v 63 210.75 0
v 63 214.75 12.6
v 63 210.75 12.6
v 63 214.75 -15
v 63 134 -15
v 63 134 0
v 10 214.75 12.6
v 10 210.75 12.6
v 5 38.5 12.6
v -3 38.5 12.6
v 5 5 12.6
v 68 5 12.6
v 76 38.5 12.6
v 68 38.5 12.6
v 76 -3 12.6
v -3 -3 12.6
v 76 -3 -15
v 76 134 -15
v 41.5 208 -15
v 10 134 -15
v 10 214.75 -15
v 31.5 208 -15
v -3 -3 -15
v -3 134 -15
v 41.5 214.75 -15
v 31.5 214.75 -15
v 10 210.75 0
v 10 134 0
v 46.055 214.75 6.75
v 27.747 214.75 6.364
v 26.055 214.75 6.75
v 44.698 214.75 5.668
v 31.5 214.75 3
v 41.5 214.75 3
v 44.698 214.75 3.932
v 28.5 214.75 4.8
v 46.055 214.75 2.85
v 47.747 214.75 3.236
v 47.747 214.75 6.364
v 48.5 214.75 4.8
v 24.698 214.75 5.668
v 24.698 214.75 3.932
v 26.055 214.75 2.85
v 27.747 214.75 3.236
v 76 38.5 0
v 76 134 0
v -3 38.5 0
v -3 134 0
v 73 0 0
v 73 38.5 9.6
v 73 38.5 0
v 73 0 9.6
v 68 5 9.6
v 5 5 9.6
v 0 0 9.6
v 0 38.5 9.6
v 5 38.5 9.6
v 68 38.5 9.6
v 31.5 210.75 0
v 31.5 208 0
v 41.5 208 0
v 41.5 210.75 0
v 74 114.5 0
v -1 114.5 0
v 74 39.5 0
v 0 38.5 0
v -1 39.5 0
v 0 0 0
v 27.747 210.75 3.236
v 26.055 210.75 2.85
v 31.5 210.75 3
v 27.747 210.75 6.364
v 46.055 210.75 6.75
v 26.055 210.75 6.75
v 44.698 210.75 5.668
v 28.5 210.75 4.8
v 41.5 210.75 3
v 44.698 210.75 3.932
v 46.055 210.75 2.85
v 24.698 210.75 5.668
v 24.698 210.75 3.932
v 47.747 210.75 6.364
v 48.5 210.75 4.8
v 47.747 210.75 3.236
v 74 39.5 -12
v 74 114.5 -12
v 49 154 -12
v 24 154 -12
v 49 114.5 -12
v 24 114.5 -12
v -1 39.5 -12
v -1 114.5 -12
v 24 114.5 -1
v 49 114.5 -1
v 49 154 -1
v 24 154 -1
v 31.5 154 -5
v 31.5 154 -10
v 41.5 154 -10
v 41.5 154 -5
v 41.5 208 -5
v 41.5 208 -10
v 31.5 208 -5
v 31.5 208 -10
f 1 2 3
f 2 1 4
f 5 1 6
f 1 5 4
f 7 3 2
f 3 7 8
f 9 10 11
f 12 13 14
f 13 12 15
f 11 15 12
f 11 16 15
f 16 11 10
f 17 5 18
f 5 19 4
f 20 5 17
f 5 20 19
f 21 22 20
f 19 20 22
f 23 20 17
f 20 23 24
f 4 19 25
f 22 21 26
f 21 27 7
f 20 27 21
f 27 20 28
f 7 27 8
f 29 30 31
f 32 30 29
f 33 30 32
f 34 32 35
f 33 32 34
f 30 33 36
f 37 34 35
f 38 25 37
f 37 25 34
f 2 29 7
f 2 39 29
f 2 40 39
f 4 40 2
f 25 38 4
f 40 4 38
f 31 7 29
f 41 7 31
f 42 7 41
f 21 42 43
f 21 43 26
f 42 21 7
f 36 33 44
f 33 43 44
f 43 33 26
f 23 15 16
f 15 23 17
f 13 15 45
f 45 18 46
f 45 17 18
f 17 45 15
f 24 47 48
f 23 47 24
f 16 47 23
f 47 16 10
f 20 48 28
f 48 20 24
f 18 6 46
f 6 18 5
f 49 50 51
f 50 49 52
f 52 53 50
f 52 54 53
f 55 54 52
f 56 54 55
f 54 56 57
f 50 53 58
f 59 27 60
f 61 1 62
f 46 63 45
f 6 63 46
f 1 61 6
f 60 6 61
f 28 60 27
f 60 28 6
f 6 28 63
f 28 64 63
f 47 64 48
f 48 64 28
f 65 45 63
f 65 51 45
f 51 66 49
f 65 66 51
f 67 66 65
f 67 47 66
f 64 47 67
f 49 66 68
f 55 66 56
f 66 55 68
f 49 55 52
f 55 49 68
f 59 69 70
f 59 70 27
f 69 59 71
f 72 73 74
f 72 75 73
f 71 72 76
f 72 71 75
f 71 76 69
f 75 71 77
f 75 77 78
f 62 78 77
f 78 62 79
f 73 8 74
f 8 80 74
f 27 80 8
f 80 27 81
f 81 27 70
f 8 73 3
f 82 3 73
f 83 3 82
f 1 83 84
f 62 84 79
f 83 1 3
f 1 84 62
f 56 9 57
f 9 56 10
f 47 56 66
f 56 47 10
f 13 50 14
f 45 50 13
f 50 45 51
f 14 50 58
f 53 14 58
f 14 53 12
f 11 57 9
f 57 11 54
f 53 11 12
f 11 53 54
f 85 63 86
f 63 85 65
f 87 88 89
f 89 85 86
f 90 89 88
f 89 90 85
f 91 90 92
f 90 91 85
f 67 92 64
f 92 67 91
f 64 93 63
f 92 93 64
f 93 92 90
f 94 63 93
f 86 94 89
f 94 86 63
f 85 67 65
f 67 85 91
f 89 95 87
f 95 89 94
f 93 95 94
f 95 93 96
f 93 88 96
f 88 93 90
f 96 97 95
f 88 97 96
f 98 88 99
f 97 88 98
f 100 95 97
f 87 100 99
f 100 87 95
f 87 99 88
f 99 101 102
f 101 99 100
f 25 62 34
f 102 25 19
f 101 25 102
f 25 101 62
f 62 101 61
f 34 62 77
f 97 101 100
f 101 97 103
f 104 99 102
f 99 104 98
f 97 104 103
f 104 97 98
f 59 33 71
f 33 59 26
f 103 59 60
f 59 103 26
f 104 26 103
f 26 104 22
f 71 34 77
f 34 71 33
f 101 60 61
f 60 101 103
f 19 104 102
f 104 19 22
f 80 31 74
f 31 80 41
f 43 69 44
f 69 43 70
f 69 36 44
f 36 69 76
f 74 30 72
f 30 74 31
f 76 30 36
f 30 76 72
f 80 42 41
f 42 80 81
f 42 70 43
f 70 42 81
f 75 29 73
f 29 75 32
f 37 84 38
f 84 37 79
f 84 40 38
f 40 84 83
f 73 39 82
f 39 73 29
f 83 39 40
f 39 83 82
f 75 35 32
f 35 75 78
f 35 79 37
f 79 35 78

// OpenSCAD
charging_base=[75, 75, 12];
phone=[72, 153, 8.6]+[1, 1, 1];
wall=3;
grab=5;

difference() {
	translate([-wall, -wall, -wall-charging_base[2]]) {
		translate([wall+10, 0, 0]) cube(phone+[-20, 2*wall+phone[1]*3/8, 2*wall]+[0, 0, charging_base[2]]);
		cube(phone+[2*wall, wall-20, 2*wall]+[0, 0, charging_base[2]]);
	}
	cube(phone);
	translate([-2*wall, phone[1]/4], 0) cube(phone+[4*wall, phone[0]/4, 4*wall]);
	translate([grab, grab, 0]) cube(phone-[2*grab, 2*grab, -wall-1]);
	translate((phone-charging_base)/2-[0, 0, phone[2]/2+charging_base[2]/2]) cube(charging_base+[0, 0, 0]);
	translate((phone-charging_base)/2-[0, -5, phone[2]/2+charging_base[2]/2]) cube(charging_base+[0, -5, 3]);
	translate([phone[0]/2-25/2, phone[1]/2, -charging_base[2]]) cube([25, phone[1]/2, charging_base[2]-1]);
	translate([phone[0]/2-10/2, phone[1], -10]) cube([10, phone[1]*2, 5]);
	translate([phone[0]/2-10/2, phone[1]*1.5-20-wall, -charging_base[2]-2*wall]) cube([10, 20, charging_base[2]+3*wall]);
	translate(phone/2-[10, 0, 0]) rotate([-90, 0, 0]) cylinder(d=4, h=2*phone[1]);
	translate(phone/2+[10, 0, 0]) rotate([-90, 0, 0]) cylinder(d=4, h=2*phone[1]);
}
